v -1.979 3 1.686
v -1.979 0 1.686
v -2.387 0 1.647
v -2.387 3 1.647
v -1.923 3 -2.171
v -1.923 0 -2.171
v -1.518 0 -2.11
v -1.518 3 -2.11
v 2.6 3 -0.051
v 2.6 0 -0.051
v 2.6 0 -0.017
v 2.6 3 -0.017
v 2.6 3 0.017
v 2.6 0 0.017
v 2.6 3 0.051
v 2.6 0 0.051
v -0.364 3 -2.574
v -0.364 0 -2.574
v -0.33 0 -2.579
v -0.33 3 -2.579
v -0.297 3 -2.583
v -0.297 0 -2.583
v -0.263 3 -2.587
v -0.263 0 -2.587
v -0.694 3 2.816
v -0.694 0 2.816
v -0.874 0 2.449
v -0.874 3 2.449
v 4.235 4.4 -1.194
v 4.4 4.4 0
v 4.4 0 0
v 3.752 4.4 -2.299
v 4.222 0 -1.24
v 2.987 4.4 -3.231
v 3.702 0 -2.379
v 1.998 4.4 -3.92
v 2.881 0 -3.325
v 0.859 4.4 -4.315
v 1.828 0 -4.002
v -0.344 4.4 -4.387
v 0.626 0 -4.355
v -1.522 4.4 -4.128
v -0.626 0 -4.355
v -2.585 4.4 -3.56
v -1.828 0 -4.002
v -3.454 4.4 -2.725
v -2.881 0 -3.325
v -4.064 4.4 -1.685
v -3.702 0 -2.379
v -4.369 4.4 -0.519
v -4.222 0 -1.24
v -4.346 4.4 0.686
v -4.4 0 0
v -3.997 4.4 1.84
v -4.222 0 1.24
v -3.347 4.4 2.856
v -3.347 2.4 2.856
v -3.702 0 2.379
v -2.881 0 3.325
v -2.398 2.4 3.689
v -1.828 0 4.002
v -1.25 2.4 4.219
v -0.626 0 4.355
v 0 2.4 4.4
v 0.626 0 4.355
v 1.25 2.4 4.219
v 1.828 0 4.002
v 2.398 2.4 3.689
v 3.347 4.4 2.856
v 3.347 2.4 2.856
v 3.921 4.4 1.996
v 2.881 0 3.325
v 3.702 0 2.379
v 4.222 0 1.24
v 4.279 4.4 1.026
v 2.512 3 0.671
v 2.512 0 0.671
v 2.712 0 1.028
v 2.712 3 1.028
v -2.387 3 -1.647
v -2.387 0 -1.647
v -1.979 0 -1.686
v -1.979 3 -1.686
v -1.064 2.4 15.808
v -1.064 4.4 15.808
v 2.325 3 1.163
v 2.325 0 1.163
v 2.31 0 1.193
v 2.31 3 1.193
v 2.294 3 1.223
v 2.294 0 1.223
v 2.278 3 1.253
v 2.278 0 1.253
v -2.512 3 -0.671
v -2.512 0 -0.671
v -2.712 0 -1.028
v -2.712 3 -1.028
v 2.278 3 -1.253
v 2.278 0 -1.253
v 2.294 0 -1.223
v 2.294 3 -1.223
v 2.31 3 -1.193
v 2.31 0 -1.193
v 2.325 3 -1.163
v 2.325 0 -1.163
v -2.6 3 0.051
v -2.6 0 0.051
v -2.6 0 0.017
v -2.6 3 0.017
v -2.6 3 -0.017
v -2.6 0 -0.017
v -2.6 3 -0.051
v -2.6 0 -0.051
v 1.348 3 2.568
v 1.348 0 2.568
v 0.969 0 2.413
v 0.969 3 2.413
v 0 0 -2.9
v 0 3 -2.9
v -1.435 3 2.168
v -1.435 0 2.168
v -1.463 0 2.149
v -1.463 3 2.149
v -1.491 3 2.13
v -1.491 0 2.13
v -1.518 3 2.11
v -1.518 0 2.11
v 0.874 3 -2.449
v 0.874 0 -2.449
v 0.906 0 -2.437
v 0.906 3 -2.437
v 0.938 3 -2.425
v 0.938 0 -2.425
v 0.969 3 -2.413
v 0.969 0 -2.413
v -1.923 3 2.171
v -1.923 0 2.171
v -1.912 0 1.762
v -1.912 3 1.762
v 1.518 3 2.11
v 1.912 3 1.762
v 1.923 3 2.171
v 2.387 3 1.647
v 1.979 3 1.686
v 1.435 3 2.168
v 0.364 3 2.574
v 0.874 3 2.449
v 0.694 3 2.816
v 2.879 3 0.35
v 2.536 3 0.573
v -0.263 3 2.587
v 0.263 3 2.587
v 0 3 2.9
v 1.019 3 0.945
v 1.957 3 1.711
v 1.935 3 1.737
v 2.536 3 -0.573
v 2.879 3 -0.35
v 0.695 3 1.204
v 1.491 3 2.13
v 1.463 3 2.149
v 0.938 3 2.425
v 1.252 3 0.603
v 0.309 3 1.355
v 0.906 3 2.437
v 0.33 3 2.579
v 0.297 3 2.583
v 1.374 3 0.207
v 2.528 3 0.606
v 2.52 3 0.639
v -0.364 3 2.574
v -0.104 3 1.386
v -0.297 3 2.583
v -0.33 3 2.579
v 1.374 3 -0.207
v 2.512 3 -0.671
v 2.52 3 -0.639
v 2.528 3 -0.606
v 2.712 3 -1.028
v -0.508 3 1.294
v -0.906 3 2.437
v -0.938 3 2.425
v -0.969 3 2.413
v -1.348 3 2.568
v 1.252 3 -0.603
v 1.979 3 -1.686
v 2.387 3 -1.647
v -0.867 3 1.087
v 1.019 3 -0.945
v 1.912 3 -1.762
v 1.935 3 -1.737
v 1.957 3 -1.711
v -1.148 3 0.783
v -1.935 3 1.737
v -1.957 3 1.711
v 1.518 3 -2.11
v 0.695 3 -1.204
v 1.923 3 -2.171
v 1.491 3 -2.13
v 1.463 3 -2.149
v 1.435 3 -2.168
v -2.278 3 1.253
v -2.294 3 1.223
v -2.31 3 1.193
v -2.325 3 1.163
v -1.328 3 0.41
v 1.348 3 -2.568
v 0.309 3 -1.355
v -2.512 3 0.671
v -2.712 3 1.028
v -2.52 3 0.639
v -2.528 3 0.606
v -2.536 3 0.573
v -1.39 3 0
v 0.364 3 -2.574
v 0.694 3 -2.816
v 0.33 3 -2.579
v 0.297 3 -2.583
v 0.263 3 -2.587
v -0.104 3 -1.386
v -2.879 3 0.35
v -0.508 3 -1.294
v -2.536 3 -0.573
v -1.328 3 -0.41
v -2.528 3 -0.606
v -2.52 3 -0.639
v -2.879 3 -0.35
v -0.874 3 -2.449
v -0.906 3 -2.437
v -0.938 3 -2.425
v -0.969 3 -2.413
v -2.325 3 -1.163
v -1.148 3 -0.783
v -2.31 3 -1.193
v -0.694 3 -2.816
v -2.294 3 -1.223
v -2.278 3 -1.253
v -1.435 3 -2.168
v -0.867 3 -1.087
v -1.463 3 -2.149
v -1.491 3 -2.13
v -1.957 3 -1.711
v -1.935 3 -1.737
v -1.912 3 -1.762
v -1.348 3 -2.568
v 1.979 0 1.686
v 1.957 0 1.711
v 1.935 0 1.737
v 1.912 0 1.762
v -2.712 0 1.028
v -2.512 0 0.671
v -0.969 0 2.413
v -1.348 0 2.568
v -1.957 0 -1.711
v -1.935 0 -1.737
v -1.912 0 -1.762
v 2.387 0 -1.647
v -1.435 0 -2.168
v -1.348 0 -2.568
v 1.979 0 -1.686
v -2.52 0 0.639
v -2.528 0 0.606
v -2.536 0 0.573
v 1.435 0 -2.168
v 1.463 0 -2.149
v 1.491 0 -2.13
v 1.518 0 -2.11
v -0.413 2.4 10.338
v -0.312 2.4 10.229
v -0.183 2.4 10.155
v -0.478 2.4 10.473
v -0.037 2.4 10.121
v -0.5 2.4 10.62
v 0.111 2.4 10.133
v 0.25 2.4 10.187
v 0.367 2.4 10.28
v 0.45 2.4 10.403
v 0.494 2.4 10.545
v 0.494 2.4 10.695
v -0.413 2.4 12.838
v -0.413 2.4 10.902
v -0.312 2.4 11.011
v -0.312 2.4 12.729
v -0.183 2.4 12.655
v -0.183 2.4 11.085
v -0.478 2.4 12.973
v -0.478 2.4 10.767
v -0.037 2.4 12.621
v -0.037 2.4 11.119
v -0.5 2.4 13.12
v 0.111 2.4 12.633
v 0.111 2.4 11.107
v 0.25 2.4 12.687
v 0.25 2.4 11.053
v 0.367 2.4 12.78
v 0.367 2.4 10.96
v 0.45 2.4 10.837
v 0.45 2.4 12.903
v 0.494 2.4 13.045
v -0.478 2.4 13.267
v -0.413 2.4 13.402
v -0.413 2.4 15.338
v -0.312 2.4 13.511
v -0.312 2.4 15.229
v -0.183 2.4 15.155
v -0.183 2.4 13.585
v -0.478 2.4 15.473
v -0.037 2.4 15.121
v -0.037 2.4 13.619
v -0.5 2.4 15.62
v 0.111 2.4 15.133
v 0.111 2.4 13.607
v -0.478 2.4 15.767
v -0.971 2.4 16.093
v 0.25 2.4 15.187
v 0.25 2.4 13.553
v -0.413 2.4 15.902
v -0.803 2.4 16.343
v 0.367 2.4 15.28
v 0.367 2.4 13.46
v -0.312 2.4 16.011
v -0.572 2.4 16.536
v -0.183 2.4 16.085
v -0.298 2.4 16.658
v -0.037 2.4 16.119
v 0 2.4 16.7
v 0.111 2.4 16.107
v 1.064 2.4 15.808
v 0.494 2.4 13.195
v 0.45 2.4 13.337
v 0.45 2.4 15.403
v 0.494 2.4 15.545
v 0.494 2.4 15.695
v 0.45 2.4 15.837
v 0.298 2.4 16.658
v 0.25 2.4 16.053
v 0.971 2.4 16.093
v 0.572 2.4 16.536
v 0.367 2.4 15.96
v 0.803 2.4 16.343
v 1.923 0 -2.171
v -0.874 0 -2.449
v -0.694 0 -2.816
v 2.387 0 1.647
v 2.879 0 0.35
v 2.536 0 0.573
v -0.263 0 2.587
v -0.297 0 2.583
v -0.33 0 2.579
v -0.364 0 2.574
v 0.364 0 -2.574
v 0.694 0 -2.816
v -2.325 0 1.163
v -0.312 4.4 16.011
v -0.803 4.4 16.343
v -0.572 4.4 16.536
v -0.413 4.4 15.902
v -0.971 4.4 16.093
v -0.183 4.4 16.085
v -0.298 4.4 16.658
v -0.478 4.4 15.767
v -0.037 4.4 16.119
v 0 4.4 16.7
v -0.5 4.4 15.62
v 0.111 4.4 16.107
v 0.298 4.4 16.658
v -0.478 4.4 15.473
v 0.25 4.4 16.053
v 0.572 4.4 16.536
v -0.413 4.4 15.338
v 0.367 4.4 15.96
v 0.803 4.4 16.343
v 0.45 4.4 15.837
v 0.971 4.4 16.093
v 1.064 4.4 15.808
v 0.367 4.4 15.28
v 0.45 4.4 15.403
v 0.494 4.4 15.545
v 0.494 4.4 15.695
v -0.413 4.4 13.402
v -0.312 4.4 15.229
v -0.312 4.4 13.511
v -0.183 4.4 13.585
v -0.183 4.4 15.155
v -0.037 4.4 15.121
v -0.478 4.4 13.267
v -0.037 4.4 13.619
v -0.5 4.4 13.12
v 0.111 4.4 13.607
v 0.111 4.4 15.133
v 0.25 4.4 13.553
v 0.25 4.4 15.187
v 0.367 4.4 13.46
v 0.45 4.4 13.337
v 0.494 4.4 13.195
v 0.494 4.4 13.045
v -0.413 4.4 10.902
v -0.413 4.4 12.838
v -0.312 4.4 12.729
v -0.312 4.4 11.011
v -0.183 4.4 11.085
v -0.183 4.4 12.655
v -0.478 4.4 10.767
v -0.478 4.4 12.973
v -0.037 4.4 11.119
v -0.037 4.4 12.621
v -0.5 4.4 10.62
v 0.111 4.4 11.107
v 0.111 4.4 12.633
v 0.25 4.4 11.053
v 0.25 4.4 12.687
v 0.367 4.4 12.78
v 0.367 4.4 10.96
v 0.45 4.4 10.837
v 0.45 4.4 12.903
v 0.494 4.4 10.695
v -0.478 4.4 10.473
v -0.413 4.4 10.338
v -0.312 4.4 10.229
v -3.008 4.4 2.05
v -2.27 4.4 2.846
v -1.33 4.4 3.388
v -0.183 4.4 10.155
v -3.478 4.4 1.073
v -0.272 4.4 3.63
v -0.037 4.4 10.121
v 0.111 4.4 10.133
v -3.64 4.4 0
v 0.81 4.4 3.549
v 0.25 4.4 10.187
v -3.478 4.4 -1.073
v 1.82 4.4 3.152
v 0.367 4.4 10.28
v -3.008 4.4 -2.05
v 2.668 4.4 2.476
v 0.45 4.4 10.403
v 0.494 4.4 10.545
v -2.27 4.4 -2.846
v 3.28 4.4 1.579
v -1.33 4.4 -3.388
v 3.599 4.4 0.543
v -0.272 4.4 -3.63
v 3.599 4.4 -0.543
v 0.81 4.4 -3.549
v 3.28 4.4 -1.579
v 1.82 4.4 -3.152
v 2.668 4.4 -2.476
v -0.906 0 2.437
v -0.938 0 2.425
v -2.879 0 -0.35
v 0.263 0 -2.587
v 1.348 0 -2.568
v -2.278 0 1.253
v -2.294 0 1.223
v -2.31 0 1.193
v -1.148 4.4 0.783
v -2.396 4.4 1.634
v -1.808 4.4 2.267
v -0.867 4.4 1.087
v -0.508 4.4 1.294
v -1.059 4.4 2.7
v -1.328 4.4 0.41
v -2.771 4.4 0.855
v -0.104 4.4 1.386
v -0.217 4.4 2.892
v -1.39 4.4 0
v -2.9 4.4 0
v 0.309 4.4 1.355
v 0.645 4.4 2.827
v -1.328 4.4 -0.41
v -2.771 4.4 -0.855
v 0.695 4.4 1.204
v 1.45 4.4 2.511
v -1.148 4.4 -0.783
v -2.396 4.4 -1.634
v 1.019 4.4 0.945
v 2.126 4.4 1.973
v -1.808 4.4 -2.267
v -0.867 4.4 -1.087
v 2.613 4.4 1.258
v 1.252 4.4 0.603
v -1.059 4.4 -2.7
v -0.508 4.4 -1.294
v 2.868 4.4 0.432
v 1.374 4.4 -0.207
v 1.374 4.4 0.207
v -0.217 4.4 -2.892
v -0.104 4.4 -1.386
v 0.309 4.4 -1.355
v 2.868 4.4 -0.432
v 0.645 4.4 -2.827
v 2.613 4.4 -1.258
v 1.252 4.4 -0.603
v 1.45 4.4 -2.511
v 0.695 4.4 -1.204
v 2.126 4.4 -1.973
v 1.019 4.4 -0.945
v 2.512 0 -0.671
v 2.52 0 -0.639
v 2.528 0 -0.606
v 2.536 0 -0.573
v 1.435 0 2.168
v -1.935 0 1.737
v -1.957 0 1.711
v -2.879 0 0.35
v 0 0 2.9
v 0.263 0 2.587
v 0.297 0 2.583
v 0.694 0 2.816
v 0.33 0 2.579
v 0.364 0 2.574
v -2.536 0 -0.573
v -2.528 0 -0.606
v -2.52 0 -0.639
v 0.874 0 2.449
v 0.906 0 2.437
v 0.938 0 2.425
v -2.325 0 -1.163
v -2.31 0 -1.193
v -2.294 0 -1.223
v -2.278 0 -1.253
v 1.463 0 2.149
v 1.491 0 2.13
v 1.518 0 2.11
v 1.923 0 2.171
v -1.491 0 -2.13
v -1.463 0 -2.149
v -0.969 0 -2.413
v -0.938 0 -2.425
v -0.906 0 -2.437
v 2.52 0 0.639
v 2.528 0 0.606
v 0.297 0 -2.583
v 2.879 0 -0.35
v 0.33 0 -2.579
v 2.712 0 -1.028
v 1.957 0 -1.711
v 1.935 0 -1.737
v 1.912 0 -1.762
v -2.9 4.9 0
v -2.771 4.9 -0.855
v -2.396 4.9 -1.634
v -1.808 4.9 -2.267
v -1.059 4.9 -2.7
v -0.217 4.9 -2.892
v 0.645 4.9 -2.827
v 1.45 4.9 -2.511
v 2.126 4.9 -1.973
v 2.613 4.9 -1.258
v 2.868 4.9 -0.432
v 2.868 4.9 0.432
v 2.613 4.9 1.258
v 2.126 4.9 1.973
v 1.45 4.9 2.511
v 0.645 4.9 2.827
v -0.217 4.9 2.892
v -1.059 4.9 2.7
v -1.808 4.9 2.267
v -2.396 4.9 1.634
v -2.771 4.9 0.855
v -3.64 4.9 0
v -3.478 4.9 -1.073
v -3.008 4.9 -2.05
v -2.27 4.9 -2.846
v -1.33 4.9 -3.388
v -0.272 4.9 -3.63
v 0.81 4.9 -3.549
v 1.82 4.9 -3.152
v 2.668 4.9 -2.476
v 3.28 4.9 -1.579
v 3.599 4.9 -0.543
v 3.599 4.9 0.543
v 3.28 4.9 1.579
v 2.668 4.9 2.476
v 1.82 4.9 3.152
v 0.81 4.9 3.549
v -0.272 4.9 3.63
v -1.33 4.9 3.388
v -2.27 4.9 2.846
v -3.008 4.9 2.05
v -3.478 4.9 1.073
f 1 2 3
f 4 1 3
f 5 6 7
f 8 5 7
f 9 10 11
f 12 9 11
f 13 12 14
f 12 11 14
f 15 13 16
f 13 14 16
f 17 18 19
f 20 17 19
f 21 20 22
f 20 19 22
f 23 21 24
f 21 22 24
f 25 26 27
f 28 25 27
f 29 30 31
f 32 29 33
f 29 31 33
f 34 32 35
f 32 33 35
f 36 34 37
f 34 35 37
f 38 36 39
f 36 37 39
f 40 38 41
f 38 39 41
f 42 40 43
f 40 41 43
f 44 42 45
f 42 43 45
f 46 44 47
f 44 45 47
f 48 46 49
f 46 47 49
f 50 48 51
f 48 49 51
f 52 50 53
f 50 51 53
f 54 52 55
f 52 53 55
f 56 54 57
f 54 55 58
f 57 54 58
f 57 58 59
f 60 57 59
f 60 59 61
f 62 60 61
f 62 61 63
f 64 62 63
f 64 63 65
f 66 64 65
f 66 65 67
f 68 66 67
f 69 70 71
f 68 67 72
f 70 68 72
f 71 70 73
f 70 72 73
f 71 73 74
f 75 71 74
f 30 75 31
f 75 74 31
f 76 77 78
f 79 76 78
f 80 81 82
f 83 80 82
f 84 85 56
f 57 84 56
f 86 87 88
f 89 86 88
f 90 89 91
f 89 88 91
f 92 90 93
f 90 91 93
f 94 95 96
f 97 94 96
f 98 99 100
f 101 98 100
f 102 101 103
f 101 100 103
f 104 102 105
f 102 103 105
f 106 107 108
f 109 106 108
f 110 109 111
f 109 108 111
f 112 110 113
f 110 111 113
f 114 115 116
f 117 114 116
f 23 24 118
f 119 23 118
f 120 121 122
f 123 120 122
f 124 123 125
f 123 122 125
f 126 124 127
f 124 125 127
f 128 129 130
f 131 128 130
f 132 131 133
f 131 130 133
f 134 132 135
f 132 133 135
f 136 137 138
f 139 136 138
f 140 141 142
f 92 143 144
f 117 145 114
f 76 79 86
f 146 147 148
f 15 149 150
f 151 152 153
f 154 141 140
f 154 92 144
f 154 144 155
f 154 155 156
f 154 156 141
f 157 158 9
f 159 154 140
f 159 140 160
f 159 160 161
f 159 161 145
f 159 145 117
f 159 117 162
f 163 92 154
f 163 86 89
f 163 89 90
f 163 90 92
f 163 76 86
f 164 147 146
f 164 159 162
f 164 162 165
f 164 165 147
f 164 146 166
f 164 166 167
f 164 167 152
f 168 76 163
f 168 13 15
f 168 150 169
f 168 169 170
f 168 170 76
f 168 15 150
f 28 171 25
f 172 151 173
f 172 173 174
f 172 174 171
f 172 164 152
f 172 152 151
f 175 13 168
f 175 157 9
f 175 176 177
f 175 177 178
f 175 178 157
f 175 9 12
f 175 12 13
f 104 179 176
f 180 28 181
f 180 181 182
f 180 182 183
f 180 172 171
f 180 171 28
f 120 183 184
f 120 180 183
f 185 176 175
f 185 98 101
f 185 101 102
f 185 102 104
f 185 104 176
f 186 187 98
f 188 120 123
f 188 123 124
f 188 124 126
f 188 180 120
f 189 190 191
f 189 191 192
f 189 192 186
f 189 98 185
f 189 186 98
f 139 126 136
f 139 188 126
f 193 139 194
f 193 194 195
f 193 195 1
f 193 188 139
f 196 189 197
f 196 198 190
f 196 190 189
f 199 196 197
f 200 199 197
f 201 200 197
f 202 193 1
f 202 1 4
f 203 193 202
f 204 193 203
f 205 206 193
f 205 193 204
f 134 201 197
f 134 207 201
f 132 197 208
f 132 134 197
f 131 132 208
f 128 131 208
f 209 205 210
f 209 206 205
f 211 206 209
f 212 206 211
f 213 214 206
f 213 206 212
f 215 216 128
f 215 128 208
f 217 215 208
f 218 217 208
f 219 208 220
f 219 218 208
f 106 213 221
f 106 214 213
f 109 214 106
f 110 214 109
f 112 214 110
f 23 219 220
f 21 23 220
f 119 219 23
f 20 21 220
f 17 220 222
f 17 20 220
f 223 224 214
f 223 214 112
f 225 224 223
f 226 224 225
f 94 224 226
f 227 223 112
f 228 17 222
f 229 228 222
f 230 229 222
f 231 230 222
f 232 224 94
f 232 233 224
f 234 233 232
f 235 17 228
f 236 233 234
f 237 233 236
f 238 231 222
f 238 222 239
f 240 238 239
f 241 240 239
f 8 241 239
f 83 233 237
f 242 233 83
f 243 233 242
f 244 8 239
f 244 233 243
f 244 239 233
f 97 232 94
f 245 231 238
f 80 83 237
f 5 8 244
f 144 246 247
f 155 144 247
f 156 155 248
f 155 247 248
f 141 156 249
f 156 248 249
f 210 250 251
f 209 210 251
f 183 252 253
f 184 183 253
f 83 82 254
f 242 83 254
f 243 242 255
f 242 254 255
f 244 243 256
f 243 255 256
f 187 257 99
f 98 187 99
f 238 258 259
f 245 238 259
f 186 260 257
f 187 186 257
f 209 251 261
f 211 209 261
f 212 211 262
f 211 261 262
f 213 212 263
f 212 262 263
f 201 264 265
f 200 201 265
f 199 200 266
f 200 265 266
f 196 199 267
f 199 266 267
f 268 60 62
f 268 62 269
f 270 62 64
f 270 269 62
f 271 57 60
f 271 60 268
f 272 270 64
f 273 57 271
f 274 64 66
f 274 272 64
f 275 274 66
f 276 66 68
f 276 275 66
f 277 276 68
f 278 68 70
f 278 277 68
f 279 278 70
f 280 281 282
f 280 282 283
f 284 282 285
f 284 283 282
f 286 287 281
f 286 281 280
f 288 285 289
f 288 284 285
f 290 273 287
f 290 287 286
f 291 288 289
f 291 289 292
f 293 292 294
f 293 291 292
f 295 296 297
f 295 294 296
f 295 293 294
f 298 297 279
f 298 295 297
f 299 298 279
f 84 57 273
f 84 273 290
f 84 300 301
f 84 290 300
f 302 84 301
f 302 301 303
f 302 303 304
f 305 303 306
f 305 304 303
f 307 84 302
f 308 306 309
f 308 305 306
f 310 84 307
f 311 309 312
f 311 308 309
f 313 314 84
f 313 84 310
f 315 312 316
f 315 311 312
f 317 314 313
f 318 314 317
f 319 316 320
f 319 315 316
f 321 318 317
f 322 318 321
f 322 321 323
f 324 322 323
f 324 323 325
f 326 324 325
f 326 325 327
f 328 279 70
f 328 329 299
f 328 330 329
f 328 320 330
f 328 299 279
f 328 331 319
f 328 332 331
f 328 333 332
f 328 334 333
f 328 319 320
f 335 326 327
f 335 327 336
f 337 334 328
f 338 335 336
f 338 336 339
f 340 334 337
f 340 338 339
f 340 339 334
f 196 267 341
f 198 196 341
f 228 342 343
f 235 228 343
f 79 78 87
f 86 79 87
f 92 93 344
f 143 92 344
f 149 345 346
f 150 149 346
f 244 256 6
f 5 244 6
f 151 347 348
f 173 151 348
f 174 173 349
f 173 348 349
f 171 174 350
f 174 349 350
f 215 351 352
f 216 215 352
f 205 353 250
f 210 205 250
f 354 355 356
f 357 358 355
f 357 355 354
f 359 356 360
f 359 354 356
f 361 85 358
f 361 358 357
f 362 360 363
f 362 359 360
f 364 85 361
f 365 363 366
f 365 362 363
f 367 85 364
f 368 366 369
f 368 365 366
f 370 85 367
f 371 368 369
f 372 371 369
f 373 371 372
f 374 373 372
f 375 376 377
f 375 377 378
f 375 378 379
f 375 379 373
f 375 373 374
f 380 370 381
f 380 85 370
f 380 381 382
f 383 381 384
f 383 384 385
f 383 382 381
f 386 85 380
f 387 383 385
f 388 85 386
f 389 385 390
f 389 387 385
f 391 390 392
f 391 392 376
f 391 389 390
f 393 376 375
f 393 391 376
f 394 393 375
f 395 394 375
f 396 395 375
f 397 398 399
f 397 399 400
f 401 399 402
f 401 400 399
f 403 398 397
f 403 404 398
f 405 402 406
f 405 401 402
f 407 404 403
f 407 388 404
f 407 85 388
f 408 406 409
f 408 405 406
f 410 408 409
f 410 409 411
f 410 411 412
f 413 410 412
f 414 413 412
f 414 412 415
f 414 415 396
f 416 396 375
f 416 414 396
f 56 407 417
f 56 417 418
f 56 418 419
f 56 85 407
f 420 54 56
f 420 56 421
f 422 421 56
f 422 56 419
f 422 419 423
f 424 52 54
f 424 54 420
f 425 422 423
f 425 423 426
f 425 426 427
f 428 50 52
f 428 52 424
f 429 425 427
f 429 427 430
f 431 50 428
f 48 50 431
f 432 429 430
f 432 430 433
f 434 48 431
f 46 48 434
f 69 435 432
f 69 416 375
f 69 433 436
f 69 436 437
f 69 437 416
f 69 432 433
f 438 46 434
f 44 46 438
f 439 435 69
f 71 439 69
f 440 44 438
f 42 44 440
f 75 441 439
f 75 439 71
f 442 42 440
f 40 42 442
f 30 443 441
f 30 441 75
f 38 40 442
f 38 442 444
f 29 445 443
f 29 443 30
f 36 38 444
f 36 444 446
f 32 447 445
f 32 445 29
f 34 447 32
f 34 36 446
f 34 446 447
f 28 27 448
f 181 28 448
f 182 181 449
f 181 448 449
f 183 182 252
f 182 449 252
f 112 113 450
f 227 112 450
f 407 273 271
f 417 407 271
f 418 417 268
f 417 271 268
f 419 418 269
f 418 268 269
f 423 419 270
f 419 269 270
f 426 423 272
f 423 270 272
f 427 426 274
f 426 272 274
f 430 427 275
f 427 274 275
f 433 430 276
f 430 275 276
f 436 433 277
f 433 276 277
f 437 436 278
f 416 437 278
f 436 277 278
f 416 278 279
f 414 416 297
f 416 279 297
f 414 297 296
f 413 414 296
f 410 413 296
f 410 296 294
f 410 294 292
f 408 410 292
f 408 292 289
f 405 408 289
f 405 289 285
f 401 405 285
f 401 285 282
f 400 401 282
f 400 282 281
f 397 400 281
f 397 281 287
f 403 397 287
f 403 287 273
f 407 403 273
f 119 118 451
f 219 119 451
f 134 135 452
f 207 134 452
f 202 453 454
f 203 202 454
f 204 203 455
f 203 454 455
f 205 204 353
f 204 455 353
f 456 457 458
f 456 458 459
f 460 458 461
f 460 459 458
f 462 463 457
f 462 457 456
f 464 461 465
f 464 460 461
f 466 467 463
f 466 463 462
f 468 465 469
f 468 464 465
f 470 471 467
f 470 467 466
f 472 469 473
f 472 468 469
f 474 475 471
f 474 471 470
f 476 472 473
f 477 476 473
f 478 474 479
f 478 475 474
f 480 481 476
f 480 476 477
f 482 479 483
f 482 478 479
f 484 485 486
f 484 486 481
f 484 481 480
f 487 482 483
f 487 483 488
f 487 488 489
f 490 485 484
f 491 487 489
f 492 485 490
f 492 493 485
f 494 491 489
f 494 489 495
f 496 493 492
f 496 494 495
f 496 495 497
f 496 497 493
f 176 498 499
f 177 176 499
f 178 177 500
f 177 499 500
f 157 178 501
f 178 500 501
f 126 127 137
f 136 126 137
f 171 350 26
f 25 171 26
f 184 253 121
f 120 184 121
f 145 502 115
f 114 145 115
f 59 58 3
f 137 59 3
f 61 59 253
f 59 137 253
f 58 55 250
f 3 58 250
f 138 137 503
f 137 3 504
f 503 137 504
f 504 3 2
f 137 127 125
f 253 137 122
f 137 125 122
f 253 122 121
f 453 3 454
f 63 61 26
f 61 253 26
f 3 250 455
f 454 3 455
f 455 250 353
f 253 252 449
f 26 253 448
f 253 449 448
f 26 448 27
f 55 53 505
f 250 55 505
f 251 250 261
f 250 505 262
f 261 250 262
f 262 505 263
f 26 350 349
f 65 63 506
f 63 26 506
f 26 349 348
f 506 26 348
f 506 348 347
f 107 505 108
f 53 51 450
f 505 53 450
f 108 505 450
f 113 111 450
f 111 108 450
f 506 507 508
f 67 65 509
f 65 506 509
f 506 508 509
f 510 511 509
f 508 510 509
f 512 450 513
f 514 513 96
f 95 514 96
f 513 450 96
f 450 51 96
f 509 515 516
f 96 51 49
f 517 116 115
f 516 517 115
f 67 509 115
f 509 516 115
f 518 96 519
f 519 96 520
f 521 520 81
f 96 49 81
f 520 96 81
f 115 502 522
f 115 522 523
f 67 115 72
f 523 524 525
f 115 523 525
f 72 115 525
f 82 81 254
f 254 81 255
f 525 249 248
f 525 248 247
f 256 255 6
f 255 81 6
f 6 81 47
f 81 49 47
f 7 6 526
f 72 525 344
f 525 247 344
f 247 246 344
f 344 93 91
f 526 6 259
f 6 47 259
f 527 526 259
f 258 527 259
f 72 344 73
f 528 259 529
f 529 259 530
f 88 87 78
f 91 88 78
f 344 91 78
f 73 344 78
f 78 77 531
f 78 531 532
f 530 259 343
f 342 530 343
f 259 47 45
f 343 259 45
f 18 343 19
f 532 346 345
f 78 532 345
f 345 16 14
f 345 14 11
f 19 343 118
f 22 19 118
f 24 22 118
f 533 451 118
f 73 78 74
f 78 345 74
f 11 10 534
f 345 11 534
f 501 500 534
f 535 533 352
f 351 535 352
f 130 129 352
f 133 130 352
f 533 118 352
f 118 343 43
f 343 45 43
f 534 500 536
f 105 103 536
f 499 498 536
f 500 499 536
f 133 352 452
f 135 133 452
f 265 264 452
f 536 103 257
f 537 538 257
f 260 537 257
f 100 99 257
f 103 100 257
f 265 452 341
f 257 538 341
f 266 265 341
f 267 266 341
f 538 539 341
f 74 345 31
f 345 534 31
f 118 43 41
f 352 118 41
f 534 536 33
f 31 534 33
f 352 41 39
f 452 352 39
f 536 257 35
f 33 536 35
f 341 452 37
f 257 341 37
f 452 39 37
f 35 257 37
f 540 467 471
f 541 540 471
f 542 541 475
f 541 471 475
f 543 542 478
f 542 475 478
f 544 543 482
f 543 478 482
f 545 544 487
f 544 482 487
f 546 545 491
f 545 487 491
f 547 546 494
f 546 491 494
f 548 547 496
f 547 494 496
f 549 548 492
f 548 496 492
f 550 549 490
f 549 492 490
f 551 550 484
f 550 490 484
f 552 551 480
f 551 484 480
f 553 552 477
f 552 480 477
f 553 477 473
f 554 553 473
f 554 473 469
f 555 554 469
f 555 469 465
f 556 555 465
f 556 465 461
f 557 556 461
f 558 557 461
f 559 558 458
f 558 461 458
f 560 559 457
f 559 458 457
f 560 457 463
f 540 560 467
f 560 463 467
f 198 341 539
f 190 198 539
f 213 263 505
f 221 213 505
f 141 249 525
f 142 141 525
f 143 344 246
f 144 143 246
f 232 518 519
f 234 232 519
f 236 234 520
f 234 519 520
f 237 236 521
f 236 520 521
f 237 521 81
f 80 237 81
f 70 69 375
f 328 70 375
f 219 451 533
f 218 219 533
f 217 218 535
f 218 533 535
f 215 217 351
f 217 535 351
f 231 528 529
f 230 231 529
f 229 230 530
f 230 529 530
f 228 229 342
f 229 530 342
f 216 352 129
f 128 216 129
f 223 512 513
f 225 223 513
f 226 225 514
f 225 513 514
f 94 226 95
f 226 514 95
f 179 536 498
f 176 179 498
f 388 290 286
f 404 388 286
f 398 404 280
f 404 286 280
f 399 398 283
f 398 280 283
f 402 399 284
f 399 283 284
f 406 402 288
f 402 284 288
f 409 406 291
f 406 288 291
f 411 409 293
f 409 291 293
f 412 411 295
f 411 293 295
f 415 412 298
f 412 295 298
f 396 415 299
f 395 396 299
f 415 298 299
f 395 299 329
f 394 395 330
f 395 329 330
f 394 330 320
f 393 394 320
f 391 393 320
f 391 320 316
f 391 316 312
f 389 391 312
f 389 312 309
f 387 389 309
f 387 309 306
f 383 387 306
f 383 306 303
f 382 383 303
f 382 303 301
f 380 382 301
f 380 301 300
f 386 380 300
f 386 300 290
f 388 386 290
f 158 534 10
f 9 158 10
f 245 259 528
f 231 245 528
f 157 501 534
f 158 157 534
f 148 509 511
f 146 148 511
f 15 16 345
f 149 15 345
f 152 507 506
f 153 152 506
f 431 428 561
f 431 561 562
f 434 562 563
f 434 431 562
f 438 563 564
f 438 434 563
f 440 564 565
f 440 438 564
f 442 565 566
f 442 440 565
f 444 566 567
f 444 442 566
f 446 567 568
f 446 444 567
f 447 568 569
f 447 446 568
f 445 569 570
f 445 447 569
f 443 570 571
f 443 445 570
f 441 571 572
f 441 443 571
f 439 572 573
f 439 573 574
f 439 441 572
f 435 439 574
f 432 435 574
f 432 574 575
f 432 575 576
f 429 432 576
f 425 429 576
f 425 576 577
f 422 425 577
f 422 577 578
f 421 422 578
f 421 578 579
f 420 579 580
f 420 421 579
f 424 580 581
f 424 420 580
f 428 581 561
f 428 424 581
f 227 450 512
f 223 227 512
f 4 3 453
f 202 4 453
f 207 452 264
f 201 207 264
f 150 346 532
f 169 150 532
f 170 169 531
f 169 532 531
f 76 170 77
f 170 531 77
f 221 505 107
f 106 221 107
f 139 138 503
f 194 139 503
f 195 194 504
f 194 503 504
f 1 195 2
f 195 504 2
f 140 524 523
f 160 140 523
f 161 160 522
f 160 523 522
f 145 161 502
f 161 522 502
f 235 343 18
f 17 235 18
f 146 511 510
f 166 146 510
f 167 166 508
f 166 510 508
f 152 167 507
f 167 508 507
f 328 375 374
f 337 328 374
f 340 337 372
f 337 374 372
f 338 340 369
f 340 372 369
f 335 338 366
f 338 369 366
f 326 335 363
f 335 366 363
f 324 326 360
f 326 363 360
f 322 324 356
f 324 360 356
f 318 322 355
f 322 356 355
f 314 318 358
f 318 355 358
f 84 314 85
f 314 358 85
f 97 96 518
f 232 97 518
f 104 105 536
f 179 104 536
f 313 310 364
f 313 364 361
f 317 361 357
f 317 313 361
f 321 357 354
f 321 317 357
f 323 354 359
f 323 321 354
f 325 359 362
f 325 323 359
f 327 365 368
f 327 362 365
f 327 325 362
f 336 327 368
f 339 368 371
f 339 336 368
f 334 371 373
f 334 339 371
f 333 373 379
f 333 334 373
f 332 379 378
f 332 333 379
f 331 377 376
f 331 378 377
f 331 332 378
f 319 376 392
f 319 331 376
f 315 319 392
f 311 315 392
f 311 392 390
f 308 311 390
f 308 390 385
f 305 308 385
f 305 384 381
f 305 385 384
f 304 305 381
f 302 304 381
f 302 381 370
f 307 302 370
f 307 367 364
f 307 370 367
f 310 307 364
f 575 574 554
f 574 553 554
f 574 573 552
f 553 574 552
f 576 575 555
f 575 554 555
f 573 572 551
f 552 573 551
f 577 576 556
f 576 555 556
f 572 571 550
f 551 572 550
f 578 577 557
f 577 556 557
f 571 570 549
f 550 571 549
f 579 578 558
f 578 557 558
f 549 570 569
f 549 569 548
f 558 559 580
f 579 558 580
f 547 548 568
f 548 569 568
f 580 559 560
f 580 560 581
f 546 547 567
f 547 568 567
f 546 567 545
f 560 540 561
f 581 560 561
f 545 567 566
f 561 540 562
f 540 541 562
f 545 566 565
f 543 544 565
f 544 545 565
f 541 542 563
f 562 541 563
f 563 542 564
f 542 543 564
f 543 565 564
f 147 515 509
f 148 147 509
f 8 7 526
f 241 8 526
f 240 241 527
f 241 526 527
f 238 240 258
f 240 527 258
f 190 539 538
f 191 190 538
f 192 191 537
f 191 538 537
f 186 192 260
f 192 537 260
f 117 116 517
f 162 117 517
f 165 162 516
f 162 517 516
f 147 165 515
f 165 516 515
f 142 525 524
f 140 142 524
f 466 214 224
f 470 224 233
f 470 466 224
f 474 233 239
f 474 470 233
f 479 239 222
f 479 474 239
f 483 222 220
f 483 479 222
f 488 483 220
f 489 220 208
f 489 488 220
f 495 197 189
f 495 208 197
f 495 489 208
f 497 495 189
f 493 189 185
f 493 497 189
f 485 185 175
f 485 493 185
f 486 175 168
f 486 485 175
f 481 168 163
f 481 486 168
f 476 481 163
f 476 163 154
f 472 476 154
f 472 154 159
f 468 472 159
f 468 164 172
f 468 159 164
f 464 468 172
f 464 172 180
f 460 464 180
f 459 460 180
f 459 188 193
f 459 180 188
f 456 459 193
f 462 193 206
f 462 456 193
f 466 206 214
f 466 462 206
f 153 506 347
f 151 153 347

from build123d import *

# Parameters (mm, degrees)
SKETCH1_R               = 4.4
BOSS_EXTRUDE1_DEPTH     = 4.4
BOSS_EXTRUDE2_DEPTH     = 2
SKETCH3_R               = 3.64
SKETCH3_R_2             = 2.9
BOSS_EXTRUDE3_DEPTH     = 0.5
SKETCH4_R               = 1.39
CUT_EXTRUDE1_DEPTH      = 5.4
SKETCH5_R               = 0.5
CUT_EXTRUDE2_DEPTH      = 5.9
LPATTERN1_COUNT         = 3
LPATTERN1_PITCH         = 2.5
MIRROR1_COPY_1_SKETCH_R = 0.5
MIRROR1_COPY_1_DEPTH    = 5.9
MIRROR1_COPY_2_SKETCH_R = 0.5
MIRROR1_COPY_2_DEPTH    = 5.9
CUT_EXTRUDE4_DEPTH      = 3
CIRPATTERN2_COUNT       = 26
SKETCH9_R               = 2.6
CUT_EXTRUDE5_DEPTH      = 3
CUT_EXTRUDE6_DEPTH      = 4.9


with BuildPart() as part:
    # Sketch1 → Boss-Extrude1 (new body)
    with BuildSketch(Plane(origin=(0, 0, 0), x_dir=(1, 0, 0), z_dir=(0, 1, 0))):
        Circle(SKETCH1_R)
    extrude(amount=BOSS_EXTRUDE1_DEPTH)

    # Sketch2 → Boss-Extrude2 (add)
    with BuildSketch(Plane(origin=(0, 4.4, 0), x_dir=(1, 0, 0), z_dir=(0, 1, 0))):
        with BuildLine():
            Line((-1.063592373, 15.807540032), (-3.347342764, 2.855747962))
            ThreePointArc((-3.347342764, 2.855747962), (0, 4.4), (3.347342764, 2.855747962))
            Line((3.347342764, 2.855747962), (1.063592373, 15.807540032))
            ThreePointArc((1.063592373, 15.807540032), (0, 16.7), (-1.063592373, 15.807540032))
        make_face()
    boss_extrude2 = extrude(amount=-BOSS_EXTRUDE2_DEPTH)

    # Sketch3 → Boss-Extrude3 (add)
    with BuildSketch(Plane(origin=(0, 4.4, 0), x_dir=(-1, 0, 0), z_dir=(0, -1, 0))):
        Circle(SKETCH3_R)
        Circle(SKETCH3_R_2, mode=Mode.SUBTRACT)
    extrude(amount=-BOSS_EXTRUDE3_DEPTH)

    # Sketch4 → Cut-Extrude1 (cut, through all)
    with BuildSketch(Plane(origin=(0, 4.4, 0), x_dir=(-1, 0, 0), z_dir=(0, -1, 0))):
        Circle(SKETCH4_R)
    extrude(amount=CUT_EXTRUDE1_DEPTH, mode=Mode.SUBTRACT)

    # Sketch5 → Cut-Extrude2 (cut, through all)
    with BuildSketch(Plane(origin=(0, 0, 0), x_dir=(-1, 0, 0), z_dir=(0, -1, 0))):
        with Locations((0, 15.62)):
            Circle(SKETCH5_R)
    cut_extrude2 = extrude(amount=-CUT_EXTRUDE2_DEPTH, mode=Mode.SUBTRACT)

    # LPattern1: Cut-Extrude2 ×3
    with Locations(*[(0, 0, i * LPATTERN1_PITCH) for i in range(1, LPATTERN1_COUNT)]):
        add(cut_extrude2, mode=Mode.SUBTRACT)

    # Mirror1: Boss-Extrude2, Cut-Extrude2 across plane
    add(boss_extrude2.mirror(Plane.XY))
    add(cut_extrude2.mirror(Plane.XY), mode=Mode.SUBTRACT)

    # Mirror1 copy 1 sketch → Mirror1 copy 1 (cut, through all)
    with BuildSketch(Plane(origin=(0, 0, -2.5), x_dir=(-1, 0, 0), z_dir=(0, -1, 0))):
        with Locations((0, -15.62)):
            Circle(MIRROR1_COPY_1_SKETCH_R)
    extrude(amount=-MIRROR1_COPY_1_DEPTH, mode=Mode.SUBTRACT)

    # Mirror1 copy 2 sketch → Mirror1 copy 2 (cut, through all)
    with BuildSketch(Plane(origin=(0, 0, -5), x_dir=(-1, 0, 0), z_dir=(0, -1, 0))):
        with Locations((0, -15.62)):
            Circle(MIRROR1_COPY_2_SKETCH_R)
    extrude(amount=-MIRROR1_COPY_2_DEPTH, mode=Mode.SUBTRACT)

    # Sketch8 → Cut-Extrude4 (cut)
    with BuildSketch(Plane(origin=(0, 0, 0), x_dir=(-1, 0, 0), z_dir=(0, -1, 0))):
        with BuildLine():
            Line((0, -2.9), (0.262912611, -2.586672952))
            ThreePointArc((0.262912611, -2.586672952), (0, -2.6), (-0.262912611, -2.586672952))
            Line((-0.262912611, -2.586672952), (0, -2.9))
        make_face()
    cut_extrude4 = extrude(amount=-CUT_EXTRUDE4_DEPTH, mode=Mode.SUBTRACT)

    # CirPattern2: Cut-Extrude4 ×26 about axis
    cirpattern2_axis = Axis((0, 0, 0), (0, 1, 0))
    for i in range(1, CIRPATTERN2_COUNT):
        add(cut_extrude4.rotate(cirpattern2_axis, i * 360 / CIRPATTERN2_COUNT), mode=Mode.SUBTRACT)

    # Sketch9 → Cut-Extrude5 (cut)
    with BuildSketch(Plane(origin=(0, 0, 0), x_dir=(-1, 0, 0), z_dir=(0, -1, 0))):
        Circle(SKETCH9_R)
    extrude(amount=-CUT_EXTRUDE5_DEPTH, mode=Mode.SUBTRACT)

    # Horn Trim Sketch → Cut-Extrude6 (cut)
    with BuildSketch(Plane.XZ):
        with BuildLine():
            Line((-4.4, 0), (-4.4, -16.7))
            Line((-4.4, -16.7), (4.4, -16.7))
            Line((4.4, -16.7), (4.4, 0))
            ThreePointArc((4.4, 0), (0, -4.4), (-4.4, 0))
        make_face()
    extrude(amount=-CUT_EXTRUDE6_DEPTH, mode=Mode.SUBTRACT)


solid = part.part
